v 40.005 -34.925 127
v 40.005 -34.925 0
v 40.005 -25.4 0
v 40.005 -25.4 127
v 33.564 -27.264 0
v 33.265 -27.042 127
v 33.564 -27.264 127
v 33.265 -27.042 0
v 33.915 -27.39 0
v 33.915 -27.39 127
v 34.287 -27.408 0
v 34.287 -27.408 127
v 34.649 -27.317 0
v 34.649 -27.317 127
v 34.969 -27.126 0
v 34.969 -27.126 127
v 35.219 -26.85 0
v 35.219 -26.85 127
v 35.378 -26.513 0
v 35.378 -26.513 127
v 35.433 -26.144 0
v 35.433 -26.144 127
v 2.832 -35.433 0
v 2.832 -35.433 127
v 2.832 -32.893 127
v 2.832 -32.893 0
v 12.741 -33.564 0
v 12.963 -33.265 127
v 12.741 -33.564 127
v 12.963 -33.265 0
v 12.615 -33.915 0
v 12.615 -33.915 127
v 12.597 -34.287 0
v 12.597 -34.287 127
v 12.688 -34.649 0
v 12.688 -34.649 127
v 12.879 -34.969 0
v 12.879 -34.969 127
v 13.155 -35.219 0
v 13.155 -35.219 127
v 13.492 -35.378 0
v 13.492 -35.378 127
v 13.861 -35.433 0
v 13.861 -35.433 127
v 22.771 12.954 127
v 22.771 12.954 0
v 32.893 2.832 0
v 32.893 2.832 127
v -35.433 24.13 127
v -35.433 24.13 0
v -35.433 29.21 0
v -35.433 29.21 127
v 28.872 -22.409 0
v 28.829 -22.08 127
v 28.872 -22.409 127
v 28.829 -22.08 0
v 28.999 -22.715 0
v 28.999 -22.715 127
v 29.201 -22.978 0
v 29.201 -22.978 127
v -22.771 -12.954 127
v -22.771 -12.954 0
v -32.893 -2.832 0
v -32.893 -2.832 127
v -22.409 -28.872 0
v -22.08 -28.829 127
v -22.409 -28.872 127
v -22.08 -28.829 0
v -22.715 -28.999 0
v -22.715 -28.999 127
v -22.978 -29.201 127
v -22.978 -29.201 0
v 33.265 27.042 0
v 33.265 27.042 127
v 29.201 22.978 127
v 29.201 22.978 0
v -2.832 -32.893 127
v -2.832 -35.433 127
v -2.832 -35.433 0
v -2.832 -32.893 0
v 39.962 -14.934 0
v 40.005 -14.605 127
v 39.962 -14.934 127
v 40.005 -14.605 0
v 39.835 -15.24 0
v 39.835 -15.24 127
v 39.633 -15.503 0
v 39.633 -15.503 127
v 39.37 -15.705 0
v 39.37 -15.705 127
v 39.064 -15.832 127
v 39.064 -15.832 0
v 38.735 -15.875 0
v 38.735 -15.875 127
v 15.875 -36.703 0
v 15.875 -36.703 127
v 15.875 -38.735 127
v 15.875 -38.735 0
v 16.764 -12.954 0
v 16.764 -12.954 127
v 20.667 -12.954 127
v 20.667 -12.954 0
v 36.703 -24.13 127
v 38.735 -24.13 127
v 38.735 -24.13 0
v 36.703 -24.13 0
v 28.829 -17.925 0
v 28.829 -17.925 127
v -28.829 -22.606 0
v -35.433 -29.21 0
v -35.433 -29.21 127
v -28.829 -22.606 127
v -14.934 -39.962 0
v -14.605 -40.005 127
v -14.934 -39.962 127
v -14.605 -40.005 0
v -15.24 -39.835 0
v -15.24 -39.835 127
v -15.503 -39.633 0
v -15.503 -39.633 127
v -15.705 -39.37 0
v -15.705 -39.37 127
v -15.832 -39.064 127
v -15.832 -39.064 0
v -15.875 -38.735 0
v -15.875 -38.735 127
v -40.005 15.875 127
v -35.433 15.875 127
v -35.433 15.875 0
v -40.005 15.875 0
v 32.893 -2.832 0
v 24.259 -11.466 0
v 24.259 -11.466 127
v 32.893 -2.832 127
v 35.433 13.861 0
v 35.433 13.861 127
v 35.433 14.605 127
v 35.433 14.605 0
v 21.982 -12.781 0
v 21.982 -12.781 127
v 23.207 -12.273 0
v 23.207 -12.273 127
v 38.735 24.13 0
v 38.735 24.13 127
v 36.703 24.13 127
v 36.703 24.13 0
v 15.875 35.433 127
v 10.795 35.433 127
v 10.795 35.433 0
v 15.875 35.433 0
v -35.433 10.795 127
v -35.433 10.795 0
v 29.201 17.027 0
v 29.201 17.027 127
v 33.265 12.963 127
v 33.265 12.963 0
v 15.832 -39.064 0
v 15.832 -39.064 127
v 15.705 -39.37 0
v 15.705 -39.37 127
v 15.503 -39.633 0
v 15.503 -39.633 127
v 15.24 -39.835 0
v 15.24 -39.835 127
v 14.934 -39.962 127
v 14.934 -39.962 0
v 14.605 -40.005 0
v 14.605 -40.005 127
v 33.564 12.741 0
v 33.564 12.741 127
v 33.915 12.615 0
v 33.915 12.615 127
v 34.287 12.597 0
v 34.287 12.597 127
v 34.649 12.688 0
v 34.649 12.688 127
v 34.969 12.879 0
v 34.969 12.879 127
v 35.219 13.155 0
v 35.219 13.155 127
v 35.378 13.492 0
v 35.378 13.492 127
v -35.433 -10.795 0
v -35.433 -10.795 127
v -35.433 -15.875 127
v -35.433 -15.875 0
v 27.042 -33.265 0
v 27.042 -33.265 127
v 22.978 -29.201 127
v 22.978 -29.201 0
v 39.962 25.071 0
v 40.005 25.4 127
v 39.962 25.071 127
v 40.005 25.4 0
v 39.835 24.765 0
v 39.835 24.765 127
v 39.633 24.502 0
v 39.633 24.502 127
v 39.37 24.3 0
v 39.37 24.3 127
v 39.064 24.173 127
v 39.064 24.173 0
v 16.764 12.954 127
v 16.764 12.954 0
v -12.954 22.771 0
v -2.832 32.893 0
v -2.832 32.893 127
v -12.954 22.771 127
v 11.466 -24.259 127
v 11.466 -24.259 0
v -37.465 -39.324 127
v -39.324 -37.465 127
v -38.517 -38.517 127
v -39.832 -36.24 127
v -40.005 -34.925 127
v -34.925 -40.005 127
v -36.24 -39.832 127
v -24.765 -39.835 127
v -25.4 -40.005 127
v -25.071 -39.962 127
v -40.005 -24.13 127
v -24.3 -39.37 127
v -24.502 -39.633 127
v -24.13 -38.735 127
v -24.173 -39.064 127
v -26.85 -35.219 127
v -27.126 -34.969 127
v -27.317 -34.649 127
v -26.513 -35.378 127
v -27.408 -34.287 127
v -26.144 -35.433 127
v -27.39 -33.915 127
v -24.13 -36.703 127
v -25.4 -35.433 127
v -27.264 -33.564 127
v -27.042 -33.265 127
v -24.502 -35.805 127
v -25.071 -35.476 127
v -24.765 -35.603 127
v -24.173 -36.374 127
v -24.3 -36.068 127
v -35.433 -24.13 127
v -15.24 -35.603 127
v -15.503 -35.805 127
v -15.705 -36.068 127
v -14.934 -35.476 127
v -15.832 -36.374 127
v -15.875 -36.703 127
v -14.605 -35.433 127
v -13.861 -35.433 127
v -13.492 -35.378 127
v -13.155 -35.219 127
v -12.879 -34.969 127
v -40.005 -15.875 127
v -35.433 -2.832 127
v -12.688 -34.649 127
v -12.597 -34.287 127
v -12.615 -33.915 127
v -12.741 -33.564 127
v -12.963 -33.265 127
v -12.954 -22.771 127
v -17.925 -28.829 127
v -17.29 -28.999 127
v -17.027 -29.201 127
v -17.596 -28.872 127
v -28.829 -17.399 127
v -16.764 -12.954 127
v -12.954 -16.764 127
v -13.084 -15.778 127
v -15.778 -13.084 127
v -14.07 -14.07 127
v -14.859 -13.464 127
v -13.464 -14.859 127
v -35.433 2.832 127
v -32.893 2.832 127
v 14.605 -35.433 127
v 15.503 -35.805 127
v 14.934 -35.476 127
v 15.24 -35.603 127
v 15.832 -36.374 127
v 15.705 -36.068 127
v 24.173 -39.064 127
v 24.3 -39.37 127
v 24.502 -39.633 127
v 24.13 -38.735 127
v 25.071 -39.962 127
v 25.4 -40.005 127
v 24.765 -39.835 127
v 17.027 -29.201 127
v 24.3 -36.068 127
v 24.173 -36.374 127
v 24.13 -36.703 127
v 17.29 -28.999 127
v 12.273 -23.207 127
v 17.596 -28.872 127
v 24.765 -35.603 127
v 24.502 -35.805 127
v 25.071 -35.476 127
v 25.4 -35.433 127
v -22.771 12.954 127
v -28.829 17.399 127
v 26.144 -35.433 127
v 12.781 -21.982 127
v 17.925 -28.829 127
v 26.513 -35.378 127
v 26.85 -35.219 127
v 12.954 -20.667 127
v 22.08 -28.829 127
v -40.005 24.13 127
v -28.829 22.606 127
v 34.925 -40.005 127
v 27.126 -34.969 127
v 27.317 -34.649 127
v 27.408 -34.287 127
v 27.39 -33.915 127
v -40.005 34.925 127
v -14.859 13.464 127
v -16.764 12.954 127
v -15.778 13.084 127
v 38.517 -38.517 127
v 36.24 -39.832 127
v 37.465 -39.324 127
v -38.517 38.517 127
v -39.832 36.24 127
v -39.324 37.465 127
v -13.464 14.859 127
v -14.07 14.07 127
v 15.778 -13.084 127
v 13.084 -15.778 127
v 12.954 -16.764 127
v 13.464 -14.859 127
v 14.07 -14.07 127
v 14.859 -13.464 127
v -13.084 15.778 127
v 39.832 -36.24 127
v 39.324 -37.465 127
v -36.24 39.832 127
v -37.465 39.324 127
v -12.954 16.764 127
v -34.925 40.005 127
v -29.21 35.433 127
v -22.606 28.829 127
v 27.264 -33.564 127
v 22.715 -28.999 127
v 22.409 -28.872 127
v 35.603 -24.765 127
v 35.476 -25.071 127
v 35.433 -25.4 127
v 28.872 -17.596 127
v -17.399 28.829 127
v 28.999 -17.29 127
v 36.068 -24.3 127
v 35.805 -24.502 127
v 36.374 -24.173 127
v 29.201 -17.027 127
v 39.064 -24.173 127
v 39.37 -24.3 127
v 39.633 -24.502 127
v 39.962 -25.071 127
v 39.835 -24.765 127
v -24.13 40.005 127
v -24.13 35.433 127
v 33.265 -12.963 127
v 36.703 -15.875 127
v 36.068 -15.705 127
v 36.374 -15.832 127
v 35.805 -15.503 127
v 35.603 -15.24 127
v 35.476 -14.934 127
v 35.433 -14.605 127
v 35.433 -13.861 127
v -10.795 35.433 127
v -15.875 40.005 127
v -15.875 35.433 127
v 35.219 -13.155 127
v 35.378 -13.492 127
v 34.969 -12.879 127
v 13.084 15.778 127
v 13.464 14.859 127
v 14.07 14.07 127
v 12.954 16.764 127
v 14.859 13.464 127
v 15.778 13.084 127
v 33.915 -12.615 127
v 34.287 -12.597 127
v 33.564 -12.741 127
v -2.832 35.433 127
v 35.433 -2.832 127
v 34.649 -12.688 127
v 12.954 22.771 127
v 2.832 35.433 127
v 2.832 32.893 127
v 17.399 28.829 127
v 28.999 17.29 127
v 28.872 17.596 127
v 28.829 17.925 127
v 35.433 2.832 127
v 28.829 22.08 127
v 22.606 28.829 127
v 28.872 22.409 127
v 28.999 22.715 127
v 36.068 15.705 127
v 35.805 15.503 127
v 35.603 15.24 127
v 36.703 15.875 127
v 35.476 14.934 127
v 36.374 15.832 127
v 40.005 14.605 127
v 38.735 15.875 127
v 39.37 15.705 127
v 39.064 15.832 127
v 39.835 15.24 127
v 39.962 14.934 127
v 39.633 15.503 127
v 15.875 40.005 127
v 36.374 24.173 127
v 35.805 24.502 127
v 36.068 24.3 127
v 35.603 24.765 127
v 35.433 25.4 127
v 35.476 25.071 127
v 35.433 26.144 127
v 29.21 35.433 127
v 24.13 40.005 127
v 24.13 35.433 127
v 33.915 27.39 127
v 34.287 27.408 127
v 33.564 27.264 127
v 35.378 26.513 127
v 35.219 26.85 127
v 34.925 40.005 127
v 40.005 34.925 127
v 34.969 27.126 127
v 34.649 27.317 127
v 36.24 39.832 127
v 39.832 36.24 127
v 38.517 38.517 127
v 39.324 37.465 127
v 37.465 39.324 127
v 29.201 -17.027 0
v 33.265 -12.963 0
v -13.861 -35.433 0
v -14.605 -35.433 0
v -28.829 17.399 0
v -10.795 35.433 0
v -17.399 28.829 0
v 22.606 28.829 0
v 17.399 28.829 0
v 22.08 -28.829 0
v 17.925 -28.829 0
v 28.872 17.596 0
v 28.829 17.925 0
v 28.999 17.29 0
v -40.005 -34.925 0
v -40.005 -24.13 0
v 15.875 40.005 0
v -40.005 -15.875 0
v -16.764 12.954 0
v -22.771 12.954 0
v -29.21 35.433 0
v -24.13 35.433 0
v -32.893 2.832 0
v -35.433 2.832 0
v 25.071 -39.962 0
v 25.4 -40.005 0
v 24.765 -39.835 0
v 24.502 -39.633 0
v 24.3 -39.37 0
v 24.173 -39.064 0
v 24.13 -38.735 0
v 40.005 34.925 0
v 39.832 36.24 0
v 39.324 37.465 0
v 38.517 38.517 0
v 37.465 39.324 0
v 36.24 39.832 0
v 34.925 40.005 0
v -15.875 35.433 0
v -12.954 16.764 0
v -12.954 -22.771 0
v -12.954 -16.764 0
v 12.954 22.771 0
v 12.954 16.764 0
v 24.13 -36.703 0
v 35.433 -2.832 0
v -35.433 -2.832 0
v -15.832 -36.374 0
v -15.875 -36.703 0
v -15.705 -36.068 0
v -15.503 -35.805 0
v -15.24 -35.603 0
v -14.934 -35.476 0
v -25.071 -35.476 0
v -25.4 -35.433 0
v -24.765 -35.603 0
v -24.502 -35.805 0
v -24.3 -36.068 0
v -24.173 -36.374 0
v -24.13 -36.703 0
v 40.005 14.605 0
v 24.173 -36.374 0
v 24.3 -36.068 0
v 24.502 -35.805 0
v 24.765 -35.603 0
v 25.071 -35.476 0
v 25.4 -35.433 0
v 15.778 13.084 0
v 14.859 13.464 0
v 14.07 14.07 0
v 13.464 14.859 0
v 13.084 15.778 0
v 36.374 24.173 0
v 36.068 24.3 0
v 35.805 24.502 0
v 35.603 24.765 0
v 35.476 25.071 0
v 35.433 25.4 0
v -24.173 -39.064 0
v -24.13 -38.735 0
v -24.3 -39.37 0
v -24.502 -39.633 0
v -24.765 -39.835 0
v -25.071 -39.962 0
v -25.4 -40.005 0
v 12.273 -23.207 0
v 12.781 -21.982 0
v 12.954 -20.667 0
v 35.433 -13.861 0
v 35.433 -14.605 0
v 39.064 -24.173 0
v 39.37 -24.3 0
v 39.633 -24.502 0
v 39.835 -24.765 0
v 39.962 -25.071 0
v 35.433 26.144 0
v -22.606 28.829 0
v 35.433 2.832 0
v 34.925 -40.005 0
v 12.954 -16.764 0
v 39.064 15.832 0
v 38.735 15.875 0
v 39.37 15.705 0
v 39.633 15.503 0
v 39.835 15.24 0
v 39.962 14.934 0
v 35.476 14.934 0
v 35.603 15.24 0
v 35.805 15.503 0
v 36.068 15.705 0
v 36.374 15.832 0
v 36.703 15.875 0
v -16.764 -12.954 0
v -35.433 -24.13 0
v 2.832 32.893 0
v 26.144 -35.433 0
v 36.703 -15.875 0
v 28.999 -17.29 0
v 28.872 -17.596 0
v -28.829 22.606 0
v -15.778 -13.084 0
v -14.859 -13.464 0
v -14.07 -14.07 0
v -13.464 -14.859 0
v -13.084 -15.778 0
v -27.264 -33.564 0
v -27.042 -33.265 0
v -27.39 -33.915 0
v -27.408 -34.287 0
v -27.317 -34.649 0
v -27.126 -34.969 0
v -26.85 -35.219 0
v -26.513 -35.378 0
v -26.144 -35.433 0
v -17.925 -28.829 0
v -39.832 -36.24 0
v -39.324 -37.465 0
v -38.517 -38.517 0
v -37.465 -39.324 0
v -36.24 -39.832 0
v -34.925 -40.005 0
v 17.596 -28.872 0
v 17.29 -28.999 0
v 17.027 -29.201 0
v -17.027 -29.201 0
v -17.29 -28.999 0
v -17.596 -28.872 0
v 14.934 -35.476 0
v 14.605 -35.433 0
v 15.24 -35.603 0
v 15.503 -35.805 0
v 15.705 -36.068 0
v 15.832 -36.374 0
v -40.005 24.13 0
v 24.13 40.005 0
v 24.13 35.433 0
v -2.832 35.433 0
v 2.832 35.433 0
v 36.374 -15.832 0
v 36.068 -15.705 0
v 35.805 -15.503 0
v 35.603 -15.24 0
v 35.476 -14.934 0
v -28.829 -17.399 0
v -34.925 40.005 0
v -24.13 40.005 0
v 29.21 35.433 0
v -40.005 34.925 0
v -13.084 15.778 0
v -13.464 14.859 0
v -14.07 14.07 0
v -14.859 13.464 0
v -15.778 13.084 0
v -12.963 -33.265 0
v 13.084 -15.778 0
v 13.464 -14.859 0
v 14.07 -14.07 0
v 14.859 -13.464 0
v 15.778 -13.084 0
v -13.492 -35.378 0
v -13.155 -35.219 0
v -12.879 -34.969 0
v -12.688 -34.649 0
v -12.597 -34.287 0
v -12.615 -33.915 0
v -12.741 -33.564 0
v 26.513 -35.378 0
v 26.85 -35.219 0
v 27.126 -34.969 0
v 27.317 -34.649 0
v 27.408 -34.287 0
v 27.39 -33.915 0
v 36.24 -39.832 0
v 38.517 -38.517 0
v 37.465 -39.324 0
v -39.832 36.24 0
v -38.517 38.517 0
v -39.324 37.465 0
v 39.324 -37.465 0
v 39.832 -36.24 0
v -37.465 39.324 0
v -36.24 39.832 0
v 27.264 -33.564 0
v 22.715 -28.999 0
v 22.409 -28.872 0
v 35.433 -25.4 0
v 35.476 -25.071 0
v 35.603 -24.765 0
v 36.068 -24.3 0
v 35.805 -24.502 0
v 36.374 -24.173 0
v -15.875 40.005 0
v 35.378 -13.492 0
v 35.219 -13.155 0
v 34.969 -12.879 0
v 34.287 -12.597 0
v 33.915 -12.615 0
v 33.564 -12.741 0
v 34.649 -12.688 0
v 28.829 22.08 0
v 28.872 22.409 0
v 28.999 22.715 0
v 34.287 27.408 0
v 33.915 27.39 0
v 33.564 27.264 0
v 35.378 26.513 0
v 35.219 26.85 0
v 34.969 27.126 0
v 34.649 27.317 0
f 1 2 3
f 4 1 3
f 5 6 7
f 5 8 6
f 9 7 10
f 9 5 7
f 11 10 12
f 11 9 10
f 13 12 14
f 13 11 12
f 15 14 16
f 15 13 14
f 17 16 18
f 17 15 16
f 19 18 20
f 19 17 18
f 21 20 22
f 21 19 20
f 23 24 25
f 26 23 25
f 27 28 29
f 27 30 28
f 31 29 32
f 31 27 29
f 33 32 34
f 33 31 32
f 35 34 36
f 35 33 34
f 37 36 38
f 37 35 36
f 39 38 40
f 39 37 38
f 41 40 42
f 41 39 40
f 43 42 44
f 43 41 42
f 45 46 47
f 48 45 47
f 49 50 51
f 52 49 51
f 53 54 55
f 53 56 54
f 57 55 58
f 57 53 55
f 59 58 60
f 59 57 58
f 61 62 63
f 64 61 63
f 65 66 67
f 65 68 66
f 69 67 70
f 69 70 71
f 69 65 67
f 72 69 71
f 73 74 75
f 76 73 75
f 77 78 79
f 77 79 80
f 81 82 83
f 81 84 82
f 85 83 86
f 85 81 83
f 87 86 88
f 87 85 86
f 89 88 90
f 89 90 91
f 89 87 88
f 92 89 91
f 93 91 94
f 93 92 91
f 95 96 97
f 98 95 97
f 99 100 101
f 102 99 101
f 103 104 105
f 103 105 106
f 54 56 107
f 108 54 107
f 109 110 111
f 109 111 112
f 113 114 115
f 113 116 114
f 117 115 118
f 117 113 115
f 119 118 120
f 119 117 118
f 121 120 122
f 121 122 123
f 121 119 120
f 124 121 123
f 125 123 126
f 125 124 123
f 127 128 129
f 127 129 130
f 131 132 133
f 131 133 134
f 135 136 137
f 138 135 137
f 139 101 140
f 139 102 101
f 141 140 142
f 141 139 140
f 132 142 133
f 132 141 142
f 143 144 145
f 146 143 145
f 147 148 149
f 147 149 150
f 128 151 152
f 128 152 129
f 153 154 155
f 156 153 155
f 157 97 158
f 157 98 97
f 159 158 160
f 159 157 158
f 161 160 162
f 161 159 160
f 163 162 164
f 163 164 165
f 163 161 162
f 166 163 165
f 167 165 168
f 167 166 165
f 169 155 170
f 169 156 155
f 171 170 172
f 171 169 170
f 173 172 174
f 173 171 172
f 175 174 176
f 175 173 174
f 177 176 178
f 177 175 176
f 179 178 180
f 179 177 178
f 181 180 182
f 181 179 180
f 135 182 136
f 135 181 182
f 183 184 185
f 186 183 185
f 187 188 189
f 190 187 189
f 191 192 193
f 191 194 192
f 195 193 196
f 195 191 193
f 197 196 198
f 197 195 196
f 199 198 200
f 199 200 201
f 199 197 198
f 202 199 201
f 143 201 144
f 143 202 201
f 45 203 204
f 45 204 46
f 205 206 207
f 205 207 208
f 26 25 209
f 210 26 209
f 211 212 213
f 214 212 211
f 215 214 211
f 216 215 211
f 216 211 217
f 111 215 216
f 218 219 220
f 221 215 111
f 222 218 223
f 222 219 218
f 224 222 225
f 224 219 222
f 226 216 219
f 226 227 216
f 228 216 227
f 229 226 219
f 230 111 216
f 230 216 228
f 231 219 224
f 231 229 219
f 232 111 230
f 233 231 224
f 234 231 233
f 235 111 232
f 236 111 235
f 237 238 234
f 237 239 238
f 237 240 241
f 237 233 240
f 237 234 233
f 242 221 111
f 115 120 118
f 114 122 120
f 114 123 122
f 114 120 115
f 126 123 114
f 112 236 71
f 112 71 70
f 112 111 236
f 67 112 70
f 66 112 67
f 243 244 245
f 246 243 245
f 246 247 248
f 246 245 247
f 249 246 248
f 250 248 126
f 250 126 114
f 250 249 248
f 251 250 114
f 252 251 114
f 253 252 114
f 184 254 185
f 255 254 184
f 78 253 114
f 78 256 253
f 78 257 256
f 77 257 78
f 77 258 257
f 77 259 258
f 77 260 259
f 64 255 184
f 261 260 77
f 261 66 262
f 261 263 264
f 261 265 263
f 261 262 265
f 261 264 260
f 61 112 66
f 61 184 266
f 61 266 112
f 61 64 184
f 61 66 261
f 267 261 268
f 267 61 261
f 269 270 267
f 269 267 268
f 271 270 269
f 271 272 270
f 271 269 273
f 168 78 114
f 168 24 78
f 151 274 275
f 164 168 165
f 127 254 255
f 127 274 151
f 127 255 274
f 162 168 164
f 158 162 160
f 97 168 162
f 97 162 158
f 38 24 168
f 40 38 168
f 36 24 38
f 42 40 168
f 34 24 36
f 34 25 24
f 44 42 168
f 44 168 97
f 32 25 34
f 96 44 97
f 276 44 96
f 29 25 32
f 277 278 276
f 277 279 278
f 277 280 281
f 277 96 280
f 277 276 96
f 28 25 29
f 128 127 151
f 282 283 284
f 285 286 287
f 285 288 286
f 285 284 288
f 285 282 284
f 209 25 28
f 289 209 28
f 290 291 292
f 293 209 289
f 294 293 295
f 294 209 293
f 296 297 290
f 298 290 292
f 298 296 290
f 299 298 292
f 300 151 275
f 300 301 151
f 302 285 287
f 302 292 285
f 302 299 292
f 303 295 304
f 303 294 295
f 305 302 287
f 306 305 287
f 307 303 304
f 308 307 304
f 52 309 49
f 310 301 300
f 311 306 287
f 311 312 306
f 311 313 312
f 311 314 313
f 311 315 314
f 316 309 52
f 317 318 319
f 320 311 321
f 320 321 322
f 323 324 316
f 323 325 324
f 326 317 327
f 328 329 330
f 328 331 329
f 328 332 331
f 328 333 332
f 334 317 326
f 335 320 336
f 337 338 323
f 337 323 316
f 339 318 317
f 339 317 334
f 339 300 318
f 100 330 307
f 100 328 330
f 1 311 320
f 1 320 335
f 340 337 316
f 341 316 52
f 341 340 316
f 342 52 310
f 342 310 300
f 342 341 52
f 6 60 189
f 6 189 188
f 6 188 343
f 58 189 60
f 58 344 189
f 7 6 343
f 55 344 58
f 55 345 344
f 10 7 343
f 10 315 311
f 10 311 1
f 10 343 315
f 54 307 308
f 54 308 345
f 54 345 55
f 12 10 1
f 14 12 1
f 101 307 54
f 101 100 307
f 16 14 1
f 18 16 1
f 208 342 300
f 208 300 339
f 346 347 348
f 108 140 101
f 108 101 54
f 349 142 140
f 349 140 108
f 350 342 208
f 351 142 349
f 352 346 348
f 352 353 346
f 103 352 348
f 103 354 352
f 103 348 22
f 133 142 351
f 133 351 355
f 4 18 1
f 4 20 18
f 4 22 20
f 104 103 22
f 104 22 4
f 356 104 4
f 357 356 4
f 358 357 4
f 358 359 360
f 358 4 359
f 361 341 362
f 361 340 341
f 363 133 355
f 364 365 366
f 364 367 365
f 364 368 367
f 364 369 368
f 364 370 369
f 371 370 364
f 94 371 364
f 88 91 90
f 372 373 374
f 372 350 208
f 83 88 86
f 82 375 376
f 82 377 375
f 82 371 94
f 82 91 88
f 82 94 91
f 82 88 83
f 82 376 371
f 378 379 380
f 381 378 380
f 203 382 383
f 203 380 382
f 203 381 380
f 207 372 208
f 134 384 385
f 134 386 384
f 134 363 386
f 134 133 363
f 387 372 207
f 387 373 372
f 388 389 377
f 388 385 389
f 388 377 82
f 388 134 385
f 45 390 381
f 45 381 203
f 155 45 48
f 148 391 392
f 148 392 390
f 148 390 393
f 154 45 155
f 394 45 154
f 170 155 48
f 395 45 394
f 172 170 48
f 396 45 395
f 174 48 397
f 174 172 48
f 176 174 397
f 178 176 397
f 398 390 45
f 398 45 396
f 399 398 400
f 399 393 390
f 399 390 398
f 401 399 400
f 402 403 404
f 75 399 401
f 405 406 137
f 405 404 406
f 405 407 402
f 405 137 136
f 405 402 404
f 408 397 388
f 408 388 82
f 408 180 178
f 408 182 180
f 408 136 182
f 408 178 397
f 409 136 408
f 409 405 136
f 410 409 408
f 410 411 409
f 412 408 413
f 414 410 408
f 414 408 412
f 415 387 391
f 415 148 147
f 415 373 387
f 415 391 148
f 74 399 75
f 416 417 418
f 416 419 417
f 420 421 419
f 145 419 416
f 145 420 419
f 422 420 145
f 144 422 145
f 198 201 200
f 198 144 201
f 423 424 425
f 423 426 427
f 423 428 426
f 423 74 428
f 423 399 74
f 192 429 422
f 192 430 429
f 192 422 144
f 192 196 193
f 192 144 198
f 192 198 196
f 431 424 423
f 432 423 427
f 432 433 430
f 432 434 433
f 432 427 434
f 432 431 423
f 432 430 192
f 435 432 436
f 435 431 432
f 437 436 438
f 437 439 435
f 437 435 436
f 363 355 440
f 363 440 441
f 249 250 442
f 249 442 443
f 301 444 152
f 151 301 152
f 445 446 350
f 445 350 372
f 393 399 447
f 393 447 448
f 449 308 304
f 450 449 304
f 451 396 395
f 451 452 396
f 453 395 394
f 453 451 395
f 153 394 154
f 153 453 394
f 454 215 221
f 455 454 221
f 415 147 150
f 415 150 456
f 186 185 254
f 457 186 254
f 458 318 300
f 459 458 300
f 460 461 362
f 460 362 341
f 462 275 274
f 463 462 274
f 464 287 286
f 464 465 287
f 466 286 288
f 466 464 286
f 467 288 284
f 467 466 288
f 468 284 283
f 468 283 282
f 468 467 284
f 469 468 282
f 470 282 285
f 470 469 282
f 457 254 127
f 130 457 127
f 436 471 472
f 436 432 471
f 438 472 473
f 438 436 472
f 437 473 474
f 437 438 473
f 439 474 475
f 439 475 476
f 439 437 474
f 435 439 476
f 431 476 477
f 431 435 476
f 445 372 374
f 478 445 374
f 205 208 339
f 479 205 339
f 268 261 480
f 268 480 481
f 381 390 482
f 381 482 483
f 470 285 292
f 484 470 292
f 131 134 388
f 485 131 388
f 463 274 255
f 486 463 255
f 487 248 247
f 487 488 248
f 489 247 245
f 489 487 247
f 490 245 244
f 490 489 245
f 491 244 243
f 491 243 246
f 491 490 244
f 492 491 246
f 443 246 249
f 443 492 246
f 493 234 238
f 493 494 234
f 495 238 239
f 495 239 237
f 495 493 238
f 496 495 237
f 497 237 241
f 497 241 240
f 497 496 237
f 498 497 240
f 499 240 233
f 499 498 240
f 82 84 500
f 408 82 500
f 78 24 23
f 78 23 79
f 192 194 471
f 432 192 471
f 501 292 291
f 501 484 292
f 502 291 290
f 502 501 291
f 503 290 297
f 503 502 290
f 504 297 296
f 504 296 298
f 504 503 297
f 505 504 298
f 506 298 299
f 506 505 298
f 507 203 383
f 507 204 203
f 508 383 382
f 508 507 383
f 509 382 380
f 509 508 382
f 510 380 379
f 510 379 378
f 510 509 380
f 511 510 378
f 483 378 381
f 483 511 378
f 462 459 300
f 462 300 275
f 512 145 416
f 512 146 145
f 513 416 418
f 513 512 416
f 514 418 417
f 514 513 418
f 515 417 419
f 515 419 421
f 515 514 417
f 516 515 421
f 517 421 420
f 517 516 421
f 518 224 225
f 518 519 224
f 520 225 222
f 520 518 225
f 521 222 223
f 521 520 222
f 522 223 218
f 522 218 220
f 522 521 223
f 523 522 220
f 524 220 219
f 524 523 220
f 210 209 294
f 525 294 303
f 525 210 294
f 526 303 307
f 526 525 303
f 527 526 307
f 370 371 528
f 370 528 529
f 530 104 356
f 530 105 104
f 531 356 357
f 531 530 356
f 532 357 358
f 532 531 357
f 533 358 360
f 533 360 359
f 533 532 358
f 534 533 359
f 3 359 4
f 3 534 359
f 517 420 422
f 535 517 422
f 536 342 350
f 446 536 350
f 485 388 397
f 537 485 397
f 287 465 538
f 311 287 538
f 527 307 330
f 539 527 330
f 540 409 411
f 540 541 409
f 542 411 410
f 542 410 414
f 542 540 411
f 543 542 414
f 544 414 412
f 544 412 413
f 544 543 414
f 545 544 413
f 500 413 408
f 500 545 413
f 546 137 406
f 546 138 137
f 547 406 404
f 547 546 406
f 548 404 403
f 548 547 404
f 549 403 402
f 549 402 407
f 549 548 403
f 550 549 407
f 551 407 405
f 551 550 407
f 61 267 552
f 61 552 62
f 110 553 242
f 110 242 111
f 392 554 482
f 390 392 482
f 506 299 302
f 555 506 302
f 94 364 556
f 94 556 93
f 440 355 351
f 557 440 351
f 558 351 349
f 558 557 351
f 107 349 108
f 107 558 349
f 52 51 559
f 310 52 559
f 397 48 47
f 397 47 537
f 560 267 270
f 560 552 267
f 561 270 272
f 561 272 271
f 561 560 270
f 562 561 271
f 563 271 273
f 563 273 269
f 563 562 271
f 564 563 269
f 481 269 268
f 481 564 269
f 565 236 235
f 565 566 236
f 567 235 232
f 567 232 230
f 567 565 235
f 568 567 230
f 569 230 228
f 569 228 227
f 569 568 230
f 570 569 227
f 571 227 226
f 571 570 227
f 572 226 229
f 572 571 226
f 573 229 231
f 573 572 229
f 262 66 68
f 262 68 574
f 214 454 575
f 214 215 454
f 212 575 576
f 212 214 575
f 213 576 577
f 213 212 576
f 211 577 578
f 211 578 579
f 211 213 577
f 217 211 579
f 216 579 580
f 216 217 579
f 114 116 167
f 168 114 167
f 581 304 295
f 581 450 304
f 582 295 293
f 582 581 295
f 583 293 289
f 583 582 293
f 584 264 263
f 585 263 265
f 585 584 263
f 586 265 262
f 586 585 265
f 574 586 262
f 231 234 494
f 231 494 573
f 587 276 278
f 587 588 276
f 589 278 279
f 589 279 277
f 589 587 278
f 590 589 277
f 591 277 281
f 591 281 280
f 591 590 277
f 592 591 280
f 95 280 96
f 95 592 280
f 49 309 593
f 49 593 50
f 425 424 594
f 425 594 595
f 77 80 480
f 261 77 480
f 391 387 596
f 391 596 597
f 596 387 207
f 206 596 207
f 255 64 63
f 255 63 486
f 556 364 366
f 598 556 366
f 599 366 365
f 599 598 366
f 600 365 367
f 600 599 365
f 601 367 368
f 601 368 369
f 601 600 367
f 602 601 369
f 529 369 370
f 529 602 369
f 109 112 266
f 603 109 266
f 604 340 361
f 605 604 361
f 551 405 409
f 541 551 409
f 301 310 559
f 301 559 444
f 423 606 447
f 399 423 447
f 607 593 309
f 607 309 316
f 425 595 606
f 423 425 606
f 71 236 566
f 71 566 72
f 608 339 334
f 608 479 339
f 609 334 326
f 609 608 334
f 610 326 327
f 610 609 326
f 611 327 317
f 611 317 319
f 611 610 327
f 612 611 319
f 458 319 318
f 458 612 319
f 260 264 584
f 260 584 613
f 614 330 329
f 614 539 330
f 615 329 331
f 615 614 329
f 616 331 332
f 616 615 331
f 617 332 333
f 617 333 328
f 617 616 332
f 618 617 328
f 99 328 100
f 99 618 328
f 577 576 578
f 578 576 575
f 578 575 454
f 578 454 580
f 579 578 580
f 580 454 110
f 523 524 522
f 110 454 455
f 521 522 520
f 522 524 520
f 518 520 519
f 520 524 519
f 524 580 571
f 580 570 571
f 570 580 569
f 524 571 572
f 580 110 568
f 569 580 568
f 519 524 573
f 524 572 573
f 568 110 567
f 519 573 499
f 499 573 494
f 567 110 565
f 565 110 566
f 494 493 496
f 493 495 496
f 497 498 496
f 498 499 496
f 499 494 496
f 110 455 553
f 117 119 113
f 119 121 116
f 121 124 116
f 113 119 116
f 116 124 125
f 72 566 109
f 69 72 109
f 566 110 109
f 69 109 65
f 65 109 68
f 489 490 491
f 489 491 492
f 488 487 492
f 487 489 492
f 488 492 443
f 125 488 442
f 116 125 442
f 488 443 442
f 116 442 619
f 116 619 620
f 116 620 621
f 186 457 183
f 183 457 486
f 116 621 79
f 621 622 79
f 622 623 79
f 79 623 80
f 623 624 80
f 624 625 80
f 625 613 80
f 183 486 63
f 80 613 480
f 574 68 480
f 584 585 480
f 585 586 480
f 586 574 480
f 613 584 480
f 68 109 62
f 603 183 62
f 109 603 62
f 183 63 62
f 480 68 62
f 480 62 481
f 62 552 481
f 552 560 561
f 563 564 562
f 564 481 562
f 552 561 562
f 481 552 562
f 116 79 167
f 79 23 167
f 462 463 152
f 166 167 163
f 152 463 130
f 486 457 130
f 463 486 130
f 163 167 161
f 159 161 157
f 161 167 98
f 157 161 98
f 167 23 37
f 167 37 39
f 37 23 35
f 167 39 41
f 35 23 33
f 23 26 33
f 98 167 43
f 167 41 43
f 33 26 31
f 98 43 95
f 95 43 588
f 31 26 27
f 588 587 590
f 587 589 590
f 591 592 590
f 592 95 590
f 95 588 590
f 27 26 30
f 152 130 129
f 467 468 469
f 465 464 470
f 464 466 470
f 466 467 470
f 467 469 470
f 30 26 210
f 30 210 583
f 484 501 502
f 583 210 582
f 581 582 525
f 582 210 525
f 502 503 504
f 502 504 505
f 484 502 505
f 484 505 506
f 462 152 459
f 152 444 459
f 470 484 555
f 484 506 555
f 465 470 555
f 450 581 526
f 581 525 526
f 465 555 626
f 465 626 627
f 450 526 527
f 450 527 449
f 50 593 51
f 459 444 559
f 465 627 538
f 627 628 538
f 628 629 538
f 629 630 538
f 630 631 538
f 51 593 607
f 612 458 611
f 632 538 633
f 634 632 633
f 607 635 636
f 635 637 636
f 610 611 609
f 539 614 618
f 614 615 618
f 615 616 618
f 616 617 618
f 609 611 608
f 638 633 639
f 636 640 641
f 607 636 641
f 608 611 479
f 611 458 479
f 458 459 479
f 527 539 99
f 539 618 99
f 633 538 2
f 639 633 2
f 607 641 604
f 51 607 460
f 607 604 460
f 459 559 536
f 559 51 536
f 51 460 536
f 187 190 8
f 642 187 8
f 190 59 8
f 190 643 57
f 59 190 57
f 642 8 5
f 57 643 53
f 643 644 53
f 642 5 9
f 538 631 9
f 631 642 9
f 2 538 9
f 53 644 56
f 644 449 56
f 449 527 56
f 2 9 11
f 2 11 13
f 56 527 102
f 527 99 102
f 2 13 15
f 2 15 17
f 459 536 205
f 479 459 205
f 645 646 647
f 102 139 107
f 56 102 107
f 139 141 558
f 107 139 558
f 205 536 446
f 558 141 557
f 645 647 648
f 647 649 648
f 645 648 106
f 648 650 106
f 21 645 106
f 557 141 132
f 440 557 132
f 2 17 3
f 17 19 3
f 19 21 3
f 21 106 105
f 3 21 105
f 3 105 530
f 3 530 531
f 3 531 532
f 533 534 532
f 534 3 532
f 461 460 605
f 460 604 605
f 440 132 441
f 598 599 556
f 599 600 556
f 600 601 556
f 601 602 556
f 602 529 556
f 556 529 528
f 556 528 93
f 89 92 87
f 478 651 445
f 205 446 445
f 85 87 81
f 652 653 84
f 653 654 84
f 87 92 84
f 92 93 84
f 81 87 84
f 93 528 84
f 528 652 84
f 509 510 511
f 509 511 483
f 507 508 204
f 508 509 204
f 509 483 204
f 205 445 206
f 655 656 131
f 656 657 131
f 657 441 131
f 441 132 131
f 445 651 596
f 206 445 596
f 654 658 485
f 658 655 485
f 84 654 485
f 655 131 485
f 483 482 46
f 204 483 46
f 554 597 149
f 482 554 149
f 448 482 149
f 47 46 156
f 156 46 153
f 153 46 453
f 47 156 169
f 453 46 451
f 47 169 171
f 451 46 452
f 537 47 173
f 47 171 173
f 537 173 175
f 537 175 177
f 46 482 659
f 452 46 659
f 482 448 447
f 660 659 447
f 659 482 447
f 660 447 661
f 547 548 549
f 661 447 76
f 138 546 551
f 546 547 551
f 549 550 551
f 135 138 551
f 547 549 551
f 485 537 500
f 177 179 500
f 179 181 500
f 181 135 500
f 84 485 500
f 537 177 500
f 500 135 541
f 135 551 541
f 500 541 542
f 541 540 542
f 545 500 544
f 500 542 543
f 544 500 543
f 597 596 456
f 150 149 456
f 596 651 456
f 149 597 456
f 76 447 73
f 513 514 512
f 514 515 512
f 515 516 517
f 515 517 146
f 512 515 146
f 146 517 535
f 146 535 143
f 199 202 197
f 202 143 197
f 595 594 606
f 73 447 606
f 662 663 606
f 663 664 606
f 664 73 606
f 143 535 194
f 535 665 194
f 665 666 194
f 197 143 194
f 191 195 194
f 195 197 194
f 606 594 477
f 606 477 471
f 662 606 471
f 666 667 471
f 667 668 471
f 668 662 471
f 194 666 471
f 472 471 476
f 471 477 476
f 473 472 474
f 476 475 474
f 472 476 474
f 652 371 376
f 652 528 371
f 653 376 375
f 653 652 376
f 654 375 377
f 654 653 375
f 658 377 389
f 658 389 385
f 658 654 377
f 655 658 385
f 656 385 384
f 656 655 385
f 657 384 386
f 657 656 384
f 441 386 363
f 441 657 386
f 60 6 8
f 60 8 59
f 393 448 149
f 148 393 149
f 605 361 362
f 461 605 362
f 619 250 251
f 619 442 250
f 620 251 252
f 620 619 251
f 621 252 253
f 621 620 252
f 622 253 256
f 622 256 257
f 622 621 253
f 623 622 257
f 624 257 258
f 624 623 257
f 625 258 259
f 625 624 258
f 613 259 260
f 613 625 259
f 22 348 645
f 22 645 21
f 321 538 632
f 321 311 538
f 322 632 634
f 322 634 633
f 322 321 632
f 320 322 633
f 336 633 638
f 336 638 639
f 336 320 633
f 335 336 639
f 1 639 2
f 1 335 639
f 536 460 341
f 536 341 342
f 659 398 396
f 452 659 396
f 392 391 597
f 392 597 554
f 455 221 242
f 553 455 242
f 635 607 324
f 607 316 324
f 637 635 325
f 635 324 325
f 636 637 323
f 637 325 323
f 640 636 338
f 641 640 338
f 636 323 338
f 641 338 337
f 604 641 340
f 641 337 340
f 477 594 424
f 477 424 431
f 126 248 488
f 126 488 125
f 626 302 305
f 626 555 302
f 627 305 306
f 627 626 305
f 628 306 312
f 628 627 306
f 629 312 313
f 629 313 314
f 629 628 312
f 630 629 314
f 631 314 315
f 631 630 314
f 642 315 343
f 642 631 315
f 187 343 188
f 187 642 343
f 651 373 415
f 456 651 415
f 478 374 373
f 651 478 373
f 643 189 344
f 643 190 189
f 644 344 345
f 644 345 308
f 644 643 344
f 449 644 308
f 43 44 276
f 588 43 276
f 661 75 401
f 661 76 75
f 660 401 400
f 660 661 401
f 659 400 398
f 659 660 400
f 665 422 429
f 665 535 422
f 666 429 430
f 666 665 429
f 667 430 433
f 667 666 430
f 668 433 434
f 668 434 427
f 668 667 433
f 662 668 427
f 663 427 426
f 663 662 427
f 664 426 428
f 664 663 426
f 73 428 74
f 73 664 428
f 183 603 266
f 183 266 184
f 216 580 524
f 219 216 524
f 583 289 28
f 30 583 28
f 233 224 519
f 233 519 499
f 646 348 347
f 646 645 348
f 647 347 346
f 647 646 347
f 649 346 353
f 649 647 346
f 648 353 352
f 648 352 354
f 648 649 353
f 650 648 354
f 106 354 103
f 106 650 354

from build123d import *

# Parameters (mm, degrees)
SKETCH1_W            = 80.01
SKETCH1_H            = 80.01
BOSS_EXTRUDE1_DEPTH  = 127
FILLET1_R            = 5.08
CUT_EXTRUDE1_DEPTH   = 140.031651253
MIRROR2_COPY_1_DEPTH = 140.031651253
MIRROR3_COPY_1_DEPTH = 140.031651253
MIRROR3_COPY_2_DEPTH = 140.031651253
MIRROR3_COPY_3_DEPTH = 140.031651253
FILLET2_R            = 1.27
CUT_EXTRUDE2_DEPTH   = 140.031651253
MIRROR5_COPY_1_DEPTH = 140.031651253
FILLET3_R            = 3.81
FILLET4_R            = 5.08


with BuildPart() as part:
    # Sketch1 → Boss-Extrude1 (new body)
    with BuildSketch(Plane.XY):
        Rectangle(SKETCH1_W, SKETCH1_H)
    extrude(amount=BOSS_EXTRUDE1_DEPTH)

    # Fillet1
    fillet1_edges = [part.edges().sort_by_distance(p)[0] for p in [
        (-40.005, 40.005, 63.5),
        (40.005, 40.005, 63.5),
        (40.005, -40.005, 63.5),
        (-40.005, -40.005, 63.5),
    ]]
    fillet(fillet1_edges, radius=FILLET1_R)

    # Sketch2 → Cut-Extrude1 (cut, through all)
    with BuildSketch(Plane.XY.offset(127)):
        Polygon((24.13, -40.005), (24.13, -35.433), (29.21, -35.433), (22.606, -28.829), (17.399, -28.829), (10.795, -35.433), (15.875, -35.433), (15.875, -40.005), align=None)
    cut_extrude1 = extrude(amount=-CUT_EXTRUDE1_DEPTH, mode=Mode.SUBTRACT)

    # Mirror1: Cut-Extrude1 across plane
    add(cut_extrude1.mirror(Plane(origin=(0, 0, 0), x_dir=(0, 0, 1), z_dir=(1, 0, 0))), mode=Mode.SUBTRACT)

    # Mirror2: Cut-Extrude1 across plane
    add(cut_extrude1.mirror(Plane.ZX), mode=Mode.SUBTRACT)

    # Mirror2 copy 1 sketch → Mirror2 copy 1 (cut, through all)
    with BuildSketch(Plane(origin=(0, 0, 127), x_dir=(-1, 0, 0), z_dir=(0, 0, 1))):
        Polygon((24.13, -40.005), (24.13, -35.433), (29.21, -35.433), (22.606, -28.829), (17.399, -28.829), (10.795, -35.433), (15.875, -35.433), (15.875, -40.005), align=None)
    extrude(amount=-MIRROR2_COPY_1_DEPTH, mode=Mode.SUBTRACT)

    # Mirror3: Cut-Extrude1 across plane
    add(cut_extrude1.mirror(Plane(origin=(0, 0, 0), x_dir=(0, 0, 1), z_dir=(0.7071067811865475, 0.7071067811865477, 0))), mode=Mode.SUBTRACT)

    # Mirror3 copy 1 sketch → Mirror3 copy 1 (cut, through all)
    with BuildSketch(Plane(origin=(0, 0, 127), x_dir=(0, 1, 0), z_dir=(0, 0, 1))):
        Polygon((24.13, -40.005), (24.13, -35.433), (29.21, -35.433), (22.606, -28.829), (17.399, -28.829), (10.795, -35.433), (15.875, -35.433), (15.875, -40.005), align=None)
    extrude(amount=-MIRROR3_COPY_1_DEPTH, mode=Mode.SUBTRACT)

    # Mirror3 copy 2 sketch → Mirror3 copy 2 (cut, through all)
    with BuildSketch(Plane(origin=(0, 0, 127), x_dir=(0, -1, 0), z_dir=(0, 0, 1))):
        Polygon((24.13, -40.005), (24.13, -35.433), (29.21, -35.433), (22.606, -28.829), (17.399, -28.829), (10.795, -35.433), (15.875, -35.433), (15.875, -40.005), align=None)
    extrude(amount=-MIRROR3_COPY_2_DEPTH, mode=Mode.SUBTRACT)

    # Mirror3 copy 3 sketch → Mirror3 copy 3 (cut, through all)
    with BuildSketch(Plane(origin=(0, 0, 127), x_dir=(0, 1, 0), z_dir=(0, 0, 1))):
        Polygon((24.13, 40.005), (24.13, 35.433), (29.21, 35.433), (22.606, 28.829), (17.399, 28.829), (10.795, 35.433), (15.875, 35.433), (15.875, 40.005), align=None)
    extrude(amount=-MIRROR3_COPY_3_DEPTH, mode=Mode.SUBTRACT)

    # Fillet2
    fillet2_edges = [part.edges().sort_by_distance(p)[0] for p in [
        (40.005, 24.13, 63.5),
        (40.005, 15.875, 63.5),
        (35.433, 15.875, 63.5),
        (35.433, 10.795, 63.5),
        (28.829, 17.399, 63.5),
        (28.829, 22.606, 63.5),
        (35.433, 29.21, 63.5),
        (35.433, 24.13, 63.5),
        (40.005, -15.875, 63.5),
        (40.005, -24.13, 63.5),
        (35.433, -24.13, 63.5),
        (35.433, -29.21, 63.5),
        (28.829, -22.606, 63.5),
        (28.829, -17.399, 63.5),
        (35.433, -10.795, 63.5),
        (35.433, -15.875, 63.5),
        (24.13, -40.005, 63.5),
        (15.875, -40.005, 63.5),
        (15.875, -35.433, 63.5),
        (10.795, -35.433, 63.5),
        (17.399, -28.829, 63.5),
        (22.606, -28.829, 63.5),
        (29.21, -35.433, 63.5),
        (24.13, -35.433, 63.5),
        (-15.875, -40.005, 63.5),
        (-24.13, -40.005, 63.5),
        (-24.13, -35.433, 63.5),
        (-29.21, -35.433, 63.5),
        (-22.606, -28.829, 63.5),
        (-17.399, -28.829, 63.5),
        (-10.795, -35.433, 63.5),
        (-15.875, -35.433, 63.5),
    ]]
    fillet(fillet2_edges, radius=FILLET2_R)

    # Sketch5 → Cut-Extrude2 (cut, through all)
    with BuildSketch(Plane.XY.offset(127)):
        Polygon((2.83202674, -32.893), (12.954, -22.77102674), (12.954, -12.954), (22.77102674, -12.954), (32.893, -2.83202674), (35.433, -2.83202674), (35.433, 0), (0, 0), (0, -35.433), (2.83202674, -35.433), align=None)
    cut_extrude2 = extrude(amount=-CUT_EXTRUDE2_DEPTH, mode=Mode.SUBTRACT)

    # Mirror4: Cut-Extrude2 across plane
    add(cut_extrude2.mirror(Plane.ZX), mode=Mode.SUBTRACT)

    # Mirror5: Cut-Extrude2 across plane
    add(cut_extrude2.mirror(Plane(origin=(0, 0, 0), x_dir=(0, 0, 1), z_dir=(1, 0, 0))), mode=Mode.SUBTRACT)

    # Mirror5 copy 1 sketch → Mirror5 copy 1 (cut, through all)
    with BuildSketch(Plane(origin=(0, 0, 127), x_dir=(-1, 0, 0), z_dir=(0, 0, 1))):
        Polygon((2.83202674, -32.893), (12.954, -22.77102674), (12.954, -12.954), (22.77102674, -12.954), (32.893, -2.83202674), (35.433, -2.83202674), (35.433, 0), (0, 0), (0, -35.433), (2.83202674, -35.433), align=None)
    extrude(amount=-MIRROR5_COPY_1_DEPTH, mode=Mode.SUBTRACT)

    # Fillet3
    fillet3_edges = [part.edges().sort_by_distance(p)[0] for p in [
        (12.954, -12.954, 63.5),
        (12.954, 12.954, 63.5),
        (-12.954, 12.954, 63.5),
        (-12.954, -12.954, 63.5),
    ]]
    fillet(fillet3_edges, radius=FILLET3_R)

    # Fillet4
    fillet4_edges = [part.edges().sort_by_distance(p)[0] for p in [
        (22.77102674, -12.954, 63.5),
        (12.954, -22.77102674, 63.5),
    ]]
    fillet(fillet4_edges, radius=FILLET4_R)


solid = part.part
